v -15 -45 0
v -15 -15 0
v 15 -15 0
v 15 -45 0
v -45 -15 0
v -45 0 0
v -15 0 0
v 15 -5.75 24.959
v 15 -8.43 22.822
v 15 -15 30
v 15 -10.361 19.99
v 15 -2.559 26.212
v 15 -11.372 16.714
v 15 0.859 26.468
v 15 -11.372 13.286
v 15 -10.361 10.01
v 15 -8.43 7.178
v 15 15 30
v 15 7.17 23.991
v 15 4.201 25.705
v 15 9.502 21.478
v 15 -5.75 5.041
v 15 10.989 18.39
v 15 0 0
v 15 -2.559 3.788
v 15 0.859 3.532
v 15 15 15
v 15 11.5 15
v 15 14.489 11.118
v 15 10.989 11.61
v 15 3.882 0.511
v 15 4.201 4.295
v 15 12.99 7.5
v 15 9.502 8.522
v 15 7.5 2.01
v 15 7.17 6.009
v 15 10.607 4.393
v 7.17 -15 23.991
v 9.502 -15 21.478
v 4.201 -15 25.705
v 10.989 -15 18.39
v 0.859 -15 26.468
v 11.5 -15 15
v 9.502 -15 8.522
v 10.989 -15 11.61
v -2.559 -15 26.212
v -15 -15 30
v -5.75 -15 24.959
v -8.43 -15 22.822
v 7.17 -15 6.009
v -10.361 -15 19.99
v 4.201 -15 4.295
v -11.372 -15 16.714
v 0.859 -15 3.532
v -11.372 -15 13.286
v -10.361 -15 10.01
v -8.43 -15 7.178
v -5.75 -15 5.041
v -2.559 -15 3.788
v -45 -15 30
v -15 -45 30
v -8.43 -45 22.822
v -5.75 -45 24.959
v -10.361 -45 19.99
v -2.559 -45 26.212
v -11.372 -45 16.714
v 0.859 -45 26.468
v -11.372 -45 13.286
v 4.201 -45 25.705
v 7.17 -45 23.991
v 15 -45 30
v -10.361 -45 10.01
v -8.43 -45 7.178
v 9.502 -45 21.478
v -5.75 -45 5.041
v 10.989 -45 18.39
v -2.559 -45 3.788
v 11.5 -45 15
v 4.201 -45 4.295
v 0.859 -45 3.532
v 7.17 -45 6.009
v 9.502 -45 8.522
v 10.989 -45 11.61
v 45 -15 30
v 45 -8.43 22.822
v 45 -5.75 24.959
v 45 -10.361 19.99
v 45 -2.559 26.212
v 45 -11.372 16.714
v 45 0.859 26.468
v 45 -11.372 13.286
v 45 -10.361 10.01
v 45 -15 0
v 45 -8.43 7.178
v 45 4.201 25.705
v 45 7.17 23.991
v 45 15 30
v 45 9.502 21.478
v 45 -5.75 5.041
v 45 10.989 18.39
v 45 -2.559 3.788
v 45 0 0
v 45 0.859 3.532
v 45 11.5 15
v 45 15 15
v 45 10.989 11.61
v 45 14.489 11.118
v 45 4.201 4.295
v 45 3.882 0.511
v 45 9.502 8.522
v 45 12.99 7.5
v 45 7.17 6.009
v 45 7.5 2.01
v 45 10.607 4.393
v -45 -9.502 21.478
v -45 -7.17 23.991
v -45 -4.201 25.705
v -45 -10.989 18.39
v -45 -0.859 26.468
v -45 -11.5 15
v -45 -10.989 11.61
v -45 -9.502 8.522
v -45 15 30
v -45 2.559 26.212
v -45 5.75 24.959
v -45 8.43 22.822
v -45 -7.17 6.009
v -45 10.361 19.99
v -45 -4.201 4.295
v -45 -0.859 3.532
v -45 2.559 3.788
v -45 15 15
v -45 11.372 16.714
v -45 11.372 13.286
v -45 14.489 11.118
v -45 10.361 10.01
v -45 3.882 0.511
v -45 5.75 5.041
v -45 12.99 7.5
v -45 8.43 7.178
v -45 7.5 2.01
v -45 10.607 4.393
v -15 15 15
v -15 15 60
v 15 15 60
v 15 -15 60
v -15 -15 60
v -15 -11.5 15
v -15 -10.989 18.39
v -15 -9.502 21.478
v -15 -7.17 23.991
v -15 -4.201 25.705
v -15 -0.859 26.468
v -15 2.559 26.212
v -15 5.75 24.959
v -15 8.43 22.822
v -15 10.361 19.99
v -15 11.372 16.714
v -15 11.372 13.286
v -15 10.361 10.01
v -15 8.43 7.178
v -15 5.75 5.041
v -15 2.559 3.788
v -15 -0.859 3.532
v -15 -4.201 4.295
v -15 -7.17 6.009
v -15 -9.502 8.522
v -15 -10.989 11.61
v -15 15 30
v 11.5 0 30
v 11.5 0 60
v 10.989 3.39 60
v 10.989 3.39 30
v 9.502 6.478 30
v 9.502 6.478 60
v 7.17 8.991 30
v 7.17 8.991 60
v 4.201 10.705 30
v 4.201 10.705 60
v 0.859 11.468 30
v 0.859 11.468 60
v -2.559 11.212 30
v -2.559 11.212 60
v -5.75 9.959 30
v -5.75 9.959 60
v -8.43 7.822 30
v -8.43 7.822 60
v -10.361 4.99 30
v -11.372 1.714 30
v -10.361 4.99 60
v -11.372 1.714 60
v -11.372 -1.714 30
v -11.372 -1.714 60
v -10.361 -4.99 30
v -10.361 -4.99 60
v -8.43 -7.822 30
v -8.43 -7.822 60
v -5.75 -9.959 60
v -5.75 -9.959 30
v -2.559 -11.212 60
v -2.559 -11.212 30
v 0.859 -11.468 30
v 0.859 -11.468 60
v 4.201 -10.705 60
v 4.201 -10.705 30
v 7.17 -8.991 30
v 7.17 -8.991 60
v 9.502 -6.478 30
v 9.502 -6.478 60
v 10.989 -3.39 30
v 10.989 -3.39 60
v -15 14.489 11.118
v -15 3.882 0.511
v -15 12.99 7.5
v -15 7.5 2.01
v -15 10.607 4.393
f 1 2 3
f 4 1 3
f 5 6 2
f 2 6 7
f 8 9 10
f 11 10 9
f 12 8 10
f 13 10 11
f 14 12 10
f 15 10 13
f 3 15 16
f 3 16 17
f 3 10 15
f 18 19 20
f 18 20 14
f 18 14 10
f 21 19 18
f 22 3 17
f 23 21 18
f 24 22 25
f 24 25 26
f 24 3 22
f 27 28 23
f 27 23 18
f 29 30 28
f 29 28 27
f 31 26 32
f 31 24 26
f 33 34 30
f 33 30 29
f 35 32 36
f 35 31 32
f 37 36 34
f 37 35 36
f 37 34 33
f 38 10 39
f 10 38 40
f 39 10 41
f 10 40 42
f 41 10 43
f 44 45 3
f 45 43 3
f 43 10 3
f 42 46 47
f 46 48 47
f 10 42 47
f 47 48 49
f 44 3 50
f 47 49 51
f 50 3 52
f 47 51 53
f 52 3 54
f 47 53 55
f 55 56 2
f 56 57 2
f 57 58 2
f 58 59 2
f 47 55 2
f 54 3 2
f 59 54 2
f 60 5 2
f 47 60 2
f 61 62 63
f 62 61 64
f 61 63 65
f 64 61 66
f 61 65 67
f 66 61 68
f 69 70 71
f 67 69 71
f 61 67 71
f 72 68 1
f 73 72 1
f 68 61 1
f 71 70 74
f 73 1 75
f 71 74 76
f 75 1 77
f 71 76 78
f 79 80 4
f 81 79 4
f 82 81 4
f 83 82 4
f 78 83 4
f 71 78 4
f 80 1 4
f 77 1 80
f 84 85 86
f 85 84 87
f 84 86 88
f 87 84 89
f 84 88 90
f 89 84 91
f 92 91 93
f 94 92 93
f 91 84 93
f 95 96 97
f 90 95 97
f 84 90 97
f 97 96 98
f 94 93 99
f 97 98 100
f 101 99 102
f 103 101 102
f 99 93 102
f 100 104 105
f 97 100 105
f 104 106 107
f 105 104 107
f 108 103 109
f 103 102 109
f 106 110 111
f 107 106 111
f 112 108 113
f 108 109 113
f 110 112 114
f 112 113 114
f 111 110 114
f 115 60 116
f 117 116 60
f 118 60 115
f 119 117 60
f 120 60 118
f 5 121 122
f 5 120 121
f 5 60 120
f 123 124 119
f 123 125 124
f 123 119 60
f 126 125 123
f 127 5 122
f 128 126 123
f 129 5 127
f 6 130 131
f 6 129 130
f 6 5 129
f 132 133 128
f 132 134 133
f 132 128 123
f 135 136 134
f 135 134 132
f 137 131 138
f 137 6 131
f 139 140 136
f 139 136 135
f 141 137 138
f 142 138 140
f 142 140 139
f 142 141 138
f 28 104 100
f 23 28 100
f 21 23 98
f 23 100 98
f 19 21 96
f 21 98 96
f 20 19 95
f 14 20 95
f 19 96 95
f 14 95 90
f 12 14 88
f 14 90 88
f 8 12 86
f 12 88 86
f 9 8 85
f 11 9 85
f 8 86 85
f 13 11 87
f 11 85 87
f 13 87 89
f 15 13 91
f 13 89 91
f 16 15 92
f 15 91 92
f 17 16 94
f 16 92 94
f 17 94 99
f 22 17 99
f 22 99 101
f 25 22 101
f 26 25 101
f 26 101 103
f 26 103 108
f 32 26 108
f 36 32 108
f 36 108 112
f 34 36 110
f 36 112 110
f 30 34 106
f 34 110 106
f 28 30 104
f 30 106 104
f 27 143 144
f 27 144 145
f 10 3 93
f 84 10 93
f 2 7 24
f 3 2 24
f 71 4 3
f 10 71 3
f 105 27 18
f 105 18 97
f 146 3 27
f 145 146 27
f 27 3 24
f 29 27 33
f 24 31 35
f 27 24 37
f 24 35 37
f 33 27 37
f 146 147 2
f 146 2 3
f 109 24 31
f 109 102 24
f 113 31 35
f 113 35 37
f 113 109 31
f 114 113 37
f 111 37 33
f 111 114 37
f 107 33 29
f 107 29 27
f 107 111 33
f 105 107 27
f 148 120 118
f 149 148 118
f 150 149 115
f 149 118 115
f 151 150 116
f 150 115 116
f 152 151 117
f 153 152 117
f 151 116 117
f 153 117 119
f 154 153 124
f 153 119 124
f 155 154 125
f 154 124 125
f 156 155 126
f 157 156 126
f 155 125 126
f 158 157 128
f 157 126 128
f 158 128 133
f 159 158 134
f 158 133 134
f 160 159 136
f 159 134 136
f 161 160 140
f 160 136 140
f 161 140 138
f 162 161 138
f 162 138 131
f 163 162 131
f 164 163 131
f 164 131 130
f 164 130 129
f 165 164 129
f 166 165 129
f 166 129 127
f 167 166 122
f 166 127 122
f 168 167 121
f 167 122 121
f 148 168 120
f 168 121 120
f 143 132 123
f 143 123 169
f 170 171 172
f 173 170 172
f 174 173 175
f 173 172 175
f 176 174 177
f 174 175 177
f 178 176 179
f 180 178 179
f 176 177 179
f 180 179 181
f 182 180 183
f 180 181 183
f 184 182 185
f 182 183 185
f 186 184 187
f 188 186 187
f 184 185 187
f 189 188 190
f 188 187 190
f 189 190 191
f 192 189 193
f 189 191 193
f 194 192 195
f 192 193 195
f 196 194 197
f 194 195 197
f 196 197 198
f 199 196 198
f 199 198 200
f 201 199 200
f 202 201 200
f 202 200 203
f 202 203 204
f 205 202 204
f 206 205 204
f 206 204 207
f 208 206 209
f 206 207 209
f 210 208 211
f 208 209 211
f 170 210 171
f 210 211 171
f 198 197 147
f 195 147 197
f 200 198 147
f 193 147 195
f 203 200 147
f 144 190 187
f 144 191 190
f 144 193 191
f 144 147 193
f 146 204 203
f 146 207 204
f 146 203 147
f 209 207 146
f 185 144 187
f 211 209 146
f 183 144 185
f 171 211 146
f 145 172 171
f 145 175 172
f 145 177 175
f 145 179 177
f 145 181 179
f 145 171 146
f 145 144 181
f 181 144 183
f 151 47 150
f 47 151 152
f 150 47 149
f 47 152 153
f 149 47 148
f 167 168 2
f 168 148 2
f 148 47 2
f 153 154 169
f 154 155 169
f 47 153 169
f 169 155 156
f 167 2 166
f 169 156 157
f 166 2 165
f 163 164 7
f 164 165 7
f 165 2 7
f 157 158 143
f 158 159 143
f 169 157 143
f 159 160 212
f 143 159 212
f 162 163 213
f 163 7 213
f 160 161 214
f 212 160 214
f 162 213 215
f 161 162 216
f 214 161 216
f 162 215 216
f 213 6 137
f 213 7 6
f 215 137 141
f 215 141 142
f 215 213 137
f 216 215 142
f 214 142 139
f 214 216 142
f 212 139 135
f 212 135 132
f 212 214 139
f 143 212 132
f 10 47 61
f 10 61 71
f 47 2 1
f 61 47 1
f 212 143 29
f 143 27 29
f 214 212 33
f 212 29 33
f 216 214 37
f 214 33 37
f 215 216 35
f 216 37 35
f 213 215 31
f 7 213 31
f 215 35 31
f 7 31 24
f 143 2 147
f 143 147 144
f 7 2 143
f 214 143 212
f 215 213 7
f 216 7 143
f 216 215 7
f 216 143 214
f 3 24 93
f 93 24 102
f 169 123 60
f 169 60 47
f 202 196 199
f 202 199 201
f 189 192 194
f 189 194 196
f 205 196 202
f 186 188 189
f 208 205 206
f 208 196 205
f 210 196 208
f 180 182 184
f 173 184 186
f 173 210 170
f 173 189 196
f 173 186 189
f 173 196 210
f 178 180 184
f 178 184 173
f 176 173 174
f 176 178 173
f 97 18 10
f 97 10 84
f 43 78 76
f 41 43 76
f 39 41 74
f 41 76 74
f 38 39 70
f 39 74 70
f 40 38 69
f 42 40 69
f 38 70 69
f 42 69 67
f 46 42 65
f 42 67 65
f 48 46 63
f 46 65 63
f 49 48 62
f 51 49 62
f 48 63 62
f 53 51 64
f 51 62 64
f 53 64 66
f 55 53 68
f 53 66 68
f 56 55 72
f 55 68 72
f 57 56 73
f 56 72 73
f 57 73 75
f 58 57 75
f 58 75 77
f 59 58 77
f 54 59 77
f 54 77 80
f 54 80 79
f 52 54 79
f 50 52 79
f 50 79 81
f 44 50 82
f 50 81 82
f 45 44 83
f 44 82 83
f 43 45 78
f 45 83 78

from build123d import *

# Parameters (mm, degrees)
F0_W      = 30
F0_H      = 30
F1_DEPTH  = 30
F2_DEPTH  = 60
F3_R      = 11.5
F7_DEPTH  = 30
F5_R      = 11.5
F8_DEPTH  = 30
F4_R      = 11.5
F9_DEPTH  = 30
F6_R      = 11.5
F10_DEPTH = 30
F11_R     = 15
F11_2_R   = 15


with BuildPart() as f1:
    # F0 (on Top) → F1 (new body)
    with BuildSketch(Plane.XY):
        with Locations((-30, 0)):
            Rectangle(F0_W, F0_H)
        Polygon((15, -45), (15, -15), (-15, -15), (-15, -45), (0, -45), align=None)
        with Locations((30, 0)):
            Rectangle(F0_W, F0_H)
    extrude(amount=F1_DEPTH)

    # F5 (on face) → F8 (cut)
    with BuildSketch(Plane(origin=(-45, 0, 0), x_dir=(0, -1, 0), z_dir=(-1, 0, 0))):
        with Locations((0, 15)):
            Circle(F5_R)
    extrude(amount=-F8_DEPTH, mode=Mode.SUBTRACT)

    # F4 (on face) → F9 (cut)
    with BuildSketch(Plane.XZ.offset(45)):
        with Locations((0, 15)):
            Circle(F4_R)
    extrude(amount=-F9_DEPTH, mode=Mode.SUBTRACT)

    # F6 (on face) → F10 (cut)
    with BuildSketch(Plane.YZ.offset(45)):
        with Locations((0, 15)):
            Circle(F6_R)
    extrude(amount=-F10_DEPTH, mode=Mode.SUBTRACT)

    # F11
    f11_edges = [f1.edges().sort_by_distance(p)[0] for p in [
        (-30, 15, 0),
        (30, 15, 0),
    ]]
    fillet(f11_edges, radius=F11_R)


with BuildPart() as f2:
    # F0 (on Top) → F2 (new body)
    with BuildSketch(Plane.XY):
        Rectangle(F0_W, F0_H)
    extrude(amount=F2_DEPTH)

    # F3 (on face) → F7 (cut)
    with BuildSketch(Plane.XY.offset(60)):
        Circle(F3_R)
    extrude(amount=-F7_DEPTH, mode=Mode.SUBTRACT)

    # F11#2
    f11_2_edges = [f2.edges().sort_by_distance(p)[0] for p in [
        (0, 15, 0),
    ]]
    fillet(f11_2_edges, radius=F11_2_R)


solid = Compound([f1.part, f2.part])
